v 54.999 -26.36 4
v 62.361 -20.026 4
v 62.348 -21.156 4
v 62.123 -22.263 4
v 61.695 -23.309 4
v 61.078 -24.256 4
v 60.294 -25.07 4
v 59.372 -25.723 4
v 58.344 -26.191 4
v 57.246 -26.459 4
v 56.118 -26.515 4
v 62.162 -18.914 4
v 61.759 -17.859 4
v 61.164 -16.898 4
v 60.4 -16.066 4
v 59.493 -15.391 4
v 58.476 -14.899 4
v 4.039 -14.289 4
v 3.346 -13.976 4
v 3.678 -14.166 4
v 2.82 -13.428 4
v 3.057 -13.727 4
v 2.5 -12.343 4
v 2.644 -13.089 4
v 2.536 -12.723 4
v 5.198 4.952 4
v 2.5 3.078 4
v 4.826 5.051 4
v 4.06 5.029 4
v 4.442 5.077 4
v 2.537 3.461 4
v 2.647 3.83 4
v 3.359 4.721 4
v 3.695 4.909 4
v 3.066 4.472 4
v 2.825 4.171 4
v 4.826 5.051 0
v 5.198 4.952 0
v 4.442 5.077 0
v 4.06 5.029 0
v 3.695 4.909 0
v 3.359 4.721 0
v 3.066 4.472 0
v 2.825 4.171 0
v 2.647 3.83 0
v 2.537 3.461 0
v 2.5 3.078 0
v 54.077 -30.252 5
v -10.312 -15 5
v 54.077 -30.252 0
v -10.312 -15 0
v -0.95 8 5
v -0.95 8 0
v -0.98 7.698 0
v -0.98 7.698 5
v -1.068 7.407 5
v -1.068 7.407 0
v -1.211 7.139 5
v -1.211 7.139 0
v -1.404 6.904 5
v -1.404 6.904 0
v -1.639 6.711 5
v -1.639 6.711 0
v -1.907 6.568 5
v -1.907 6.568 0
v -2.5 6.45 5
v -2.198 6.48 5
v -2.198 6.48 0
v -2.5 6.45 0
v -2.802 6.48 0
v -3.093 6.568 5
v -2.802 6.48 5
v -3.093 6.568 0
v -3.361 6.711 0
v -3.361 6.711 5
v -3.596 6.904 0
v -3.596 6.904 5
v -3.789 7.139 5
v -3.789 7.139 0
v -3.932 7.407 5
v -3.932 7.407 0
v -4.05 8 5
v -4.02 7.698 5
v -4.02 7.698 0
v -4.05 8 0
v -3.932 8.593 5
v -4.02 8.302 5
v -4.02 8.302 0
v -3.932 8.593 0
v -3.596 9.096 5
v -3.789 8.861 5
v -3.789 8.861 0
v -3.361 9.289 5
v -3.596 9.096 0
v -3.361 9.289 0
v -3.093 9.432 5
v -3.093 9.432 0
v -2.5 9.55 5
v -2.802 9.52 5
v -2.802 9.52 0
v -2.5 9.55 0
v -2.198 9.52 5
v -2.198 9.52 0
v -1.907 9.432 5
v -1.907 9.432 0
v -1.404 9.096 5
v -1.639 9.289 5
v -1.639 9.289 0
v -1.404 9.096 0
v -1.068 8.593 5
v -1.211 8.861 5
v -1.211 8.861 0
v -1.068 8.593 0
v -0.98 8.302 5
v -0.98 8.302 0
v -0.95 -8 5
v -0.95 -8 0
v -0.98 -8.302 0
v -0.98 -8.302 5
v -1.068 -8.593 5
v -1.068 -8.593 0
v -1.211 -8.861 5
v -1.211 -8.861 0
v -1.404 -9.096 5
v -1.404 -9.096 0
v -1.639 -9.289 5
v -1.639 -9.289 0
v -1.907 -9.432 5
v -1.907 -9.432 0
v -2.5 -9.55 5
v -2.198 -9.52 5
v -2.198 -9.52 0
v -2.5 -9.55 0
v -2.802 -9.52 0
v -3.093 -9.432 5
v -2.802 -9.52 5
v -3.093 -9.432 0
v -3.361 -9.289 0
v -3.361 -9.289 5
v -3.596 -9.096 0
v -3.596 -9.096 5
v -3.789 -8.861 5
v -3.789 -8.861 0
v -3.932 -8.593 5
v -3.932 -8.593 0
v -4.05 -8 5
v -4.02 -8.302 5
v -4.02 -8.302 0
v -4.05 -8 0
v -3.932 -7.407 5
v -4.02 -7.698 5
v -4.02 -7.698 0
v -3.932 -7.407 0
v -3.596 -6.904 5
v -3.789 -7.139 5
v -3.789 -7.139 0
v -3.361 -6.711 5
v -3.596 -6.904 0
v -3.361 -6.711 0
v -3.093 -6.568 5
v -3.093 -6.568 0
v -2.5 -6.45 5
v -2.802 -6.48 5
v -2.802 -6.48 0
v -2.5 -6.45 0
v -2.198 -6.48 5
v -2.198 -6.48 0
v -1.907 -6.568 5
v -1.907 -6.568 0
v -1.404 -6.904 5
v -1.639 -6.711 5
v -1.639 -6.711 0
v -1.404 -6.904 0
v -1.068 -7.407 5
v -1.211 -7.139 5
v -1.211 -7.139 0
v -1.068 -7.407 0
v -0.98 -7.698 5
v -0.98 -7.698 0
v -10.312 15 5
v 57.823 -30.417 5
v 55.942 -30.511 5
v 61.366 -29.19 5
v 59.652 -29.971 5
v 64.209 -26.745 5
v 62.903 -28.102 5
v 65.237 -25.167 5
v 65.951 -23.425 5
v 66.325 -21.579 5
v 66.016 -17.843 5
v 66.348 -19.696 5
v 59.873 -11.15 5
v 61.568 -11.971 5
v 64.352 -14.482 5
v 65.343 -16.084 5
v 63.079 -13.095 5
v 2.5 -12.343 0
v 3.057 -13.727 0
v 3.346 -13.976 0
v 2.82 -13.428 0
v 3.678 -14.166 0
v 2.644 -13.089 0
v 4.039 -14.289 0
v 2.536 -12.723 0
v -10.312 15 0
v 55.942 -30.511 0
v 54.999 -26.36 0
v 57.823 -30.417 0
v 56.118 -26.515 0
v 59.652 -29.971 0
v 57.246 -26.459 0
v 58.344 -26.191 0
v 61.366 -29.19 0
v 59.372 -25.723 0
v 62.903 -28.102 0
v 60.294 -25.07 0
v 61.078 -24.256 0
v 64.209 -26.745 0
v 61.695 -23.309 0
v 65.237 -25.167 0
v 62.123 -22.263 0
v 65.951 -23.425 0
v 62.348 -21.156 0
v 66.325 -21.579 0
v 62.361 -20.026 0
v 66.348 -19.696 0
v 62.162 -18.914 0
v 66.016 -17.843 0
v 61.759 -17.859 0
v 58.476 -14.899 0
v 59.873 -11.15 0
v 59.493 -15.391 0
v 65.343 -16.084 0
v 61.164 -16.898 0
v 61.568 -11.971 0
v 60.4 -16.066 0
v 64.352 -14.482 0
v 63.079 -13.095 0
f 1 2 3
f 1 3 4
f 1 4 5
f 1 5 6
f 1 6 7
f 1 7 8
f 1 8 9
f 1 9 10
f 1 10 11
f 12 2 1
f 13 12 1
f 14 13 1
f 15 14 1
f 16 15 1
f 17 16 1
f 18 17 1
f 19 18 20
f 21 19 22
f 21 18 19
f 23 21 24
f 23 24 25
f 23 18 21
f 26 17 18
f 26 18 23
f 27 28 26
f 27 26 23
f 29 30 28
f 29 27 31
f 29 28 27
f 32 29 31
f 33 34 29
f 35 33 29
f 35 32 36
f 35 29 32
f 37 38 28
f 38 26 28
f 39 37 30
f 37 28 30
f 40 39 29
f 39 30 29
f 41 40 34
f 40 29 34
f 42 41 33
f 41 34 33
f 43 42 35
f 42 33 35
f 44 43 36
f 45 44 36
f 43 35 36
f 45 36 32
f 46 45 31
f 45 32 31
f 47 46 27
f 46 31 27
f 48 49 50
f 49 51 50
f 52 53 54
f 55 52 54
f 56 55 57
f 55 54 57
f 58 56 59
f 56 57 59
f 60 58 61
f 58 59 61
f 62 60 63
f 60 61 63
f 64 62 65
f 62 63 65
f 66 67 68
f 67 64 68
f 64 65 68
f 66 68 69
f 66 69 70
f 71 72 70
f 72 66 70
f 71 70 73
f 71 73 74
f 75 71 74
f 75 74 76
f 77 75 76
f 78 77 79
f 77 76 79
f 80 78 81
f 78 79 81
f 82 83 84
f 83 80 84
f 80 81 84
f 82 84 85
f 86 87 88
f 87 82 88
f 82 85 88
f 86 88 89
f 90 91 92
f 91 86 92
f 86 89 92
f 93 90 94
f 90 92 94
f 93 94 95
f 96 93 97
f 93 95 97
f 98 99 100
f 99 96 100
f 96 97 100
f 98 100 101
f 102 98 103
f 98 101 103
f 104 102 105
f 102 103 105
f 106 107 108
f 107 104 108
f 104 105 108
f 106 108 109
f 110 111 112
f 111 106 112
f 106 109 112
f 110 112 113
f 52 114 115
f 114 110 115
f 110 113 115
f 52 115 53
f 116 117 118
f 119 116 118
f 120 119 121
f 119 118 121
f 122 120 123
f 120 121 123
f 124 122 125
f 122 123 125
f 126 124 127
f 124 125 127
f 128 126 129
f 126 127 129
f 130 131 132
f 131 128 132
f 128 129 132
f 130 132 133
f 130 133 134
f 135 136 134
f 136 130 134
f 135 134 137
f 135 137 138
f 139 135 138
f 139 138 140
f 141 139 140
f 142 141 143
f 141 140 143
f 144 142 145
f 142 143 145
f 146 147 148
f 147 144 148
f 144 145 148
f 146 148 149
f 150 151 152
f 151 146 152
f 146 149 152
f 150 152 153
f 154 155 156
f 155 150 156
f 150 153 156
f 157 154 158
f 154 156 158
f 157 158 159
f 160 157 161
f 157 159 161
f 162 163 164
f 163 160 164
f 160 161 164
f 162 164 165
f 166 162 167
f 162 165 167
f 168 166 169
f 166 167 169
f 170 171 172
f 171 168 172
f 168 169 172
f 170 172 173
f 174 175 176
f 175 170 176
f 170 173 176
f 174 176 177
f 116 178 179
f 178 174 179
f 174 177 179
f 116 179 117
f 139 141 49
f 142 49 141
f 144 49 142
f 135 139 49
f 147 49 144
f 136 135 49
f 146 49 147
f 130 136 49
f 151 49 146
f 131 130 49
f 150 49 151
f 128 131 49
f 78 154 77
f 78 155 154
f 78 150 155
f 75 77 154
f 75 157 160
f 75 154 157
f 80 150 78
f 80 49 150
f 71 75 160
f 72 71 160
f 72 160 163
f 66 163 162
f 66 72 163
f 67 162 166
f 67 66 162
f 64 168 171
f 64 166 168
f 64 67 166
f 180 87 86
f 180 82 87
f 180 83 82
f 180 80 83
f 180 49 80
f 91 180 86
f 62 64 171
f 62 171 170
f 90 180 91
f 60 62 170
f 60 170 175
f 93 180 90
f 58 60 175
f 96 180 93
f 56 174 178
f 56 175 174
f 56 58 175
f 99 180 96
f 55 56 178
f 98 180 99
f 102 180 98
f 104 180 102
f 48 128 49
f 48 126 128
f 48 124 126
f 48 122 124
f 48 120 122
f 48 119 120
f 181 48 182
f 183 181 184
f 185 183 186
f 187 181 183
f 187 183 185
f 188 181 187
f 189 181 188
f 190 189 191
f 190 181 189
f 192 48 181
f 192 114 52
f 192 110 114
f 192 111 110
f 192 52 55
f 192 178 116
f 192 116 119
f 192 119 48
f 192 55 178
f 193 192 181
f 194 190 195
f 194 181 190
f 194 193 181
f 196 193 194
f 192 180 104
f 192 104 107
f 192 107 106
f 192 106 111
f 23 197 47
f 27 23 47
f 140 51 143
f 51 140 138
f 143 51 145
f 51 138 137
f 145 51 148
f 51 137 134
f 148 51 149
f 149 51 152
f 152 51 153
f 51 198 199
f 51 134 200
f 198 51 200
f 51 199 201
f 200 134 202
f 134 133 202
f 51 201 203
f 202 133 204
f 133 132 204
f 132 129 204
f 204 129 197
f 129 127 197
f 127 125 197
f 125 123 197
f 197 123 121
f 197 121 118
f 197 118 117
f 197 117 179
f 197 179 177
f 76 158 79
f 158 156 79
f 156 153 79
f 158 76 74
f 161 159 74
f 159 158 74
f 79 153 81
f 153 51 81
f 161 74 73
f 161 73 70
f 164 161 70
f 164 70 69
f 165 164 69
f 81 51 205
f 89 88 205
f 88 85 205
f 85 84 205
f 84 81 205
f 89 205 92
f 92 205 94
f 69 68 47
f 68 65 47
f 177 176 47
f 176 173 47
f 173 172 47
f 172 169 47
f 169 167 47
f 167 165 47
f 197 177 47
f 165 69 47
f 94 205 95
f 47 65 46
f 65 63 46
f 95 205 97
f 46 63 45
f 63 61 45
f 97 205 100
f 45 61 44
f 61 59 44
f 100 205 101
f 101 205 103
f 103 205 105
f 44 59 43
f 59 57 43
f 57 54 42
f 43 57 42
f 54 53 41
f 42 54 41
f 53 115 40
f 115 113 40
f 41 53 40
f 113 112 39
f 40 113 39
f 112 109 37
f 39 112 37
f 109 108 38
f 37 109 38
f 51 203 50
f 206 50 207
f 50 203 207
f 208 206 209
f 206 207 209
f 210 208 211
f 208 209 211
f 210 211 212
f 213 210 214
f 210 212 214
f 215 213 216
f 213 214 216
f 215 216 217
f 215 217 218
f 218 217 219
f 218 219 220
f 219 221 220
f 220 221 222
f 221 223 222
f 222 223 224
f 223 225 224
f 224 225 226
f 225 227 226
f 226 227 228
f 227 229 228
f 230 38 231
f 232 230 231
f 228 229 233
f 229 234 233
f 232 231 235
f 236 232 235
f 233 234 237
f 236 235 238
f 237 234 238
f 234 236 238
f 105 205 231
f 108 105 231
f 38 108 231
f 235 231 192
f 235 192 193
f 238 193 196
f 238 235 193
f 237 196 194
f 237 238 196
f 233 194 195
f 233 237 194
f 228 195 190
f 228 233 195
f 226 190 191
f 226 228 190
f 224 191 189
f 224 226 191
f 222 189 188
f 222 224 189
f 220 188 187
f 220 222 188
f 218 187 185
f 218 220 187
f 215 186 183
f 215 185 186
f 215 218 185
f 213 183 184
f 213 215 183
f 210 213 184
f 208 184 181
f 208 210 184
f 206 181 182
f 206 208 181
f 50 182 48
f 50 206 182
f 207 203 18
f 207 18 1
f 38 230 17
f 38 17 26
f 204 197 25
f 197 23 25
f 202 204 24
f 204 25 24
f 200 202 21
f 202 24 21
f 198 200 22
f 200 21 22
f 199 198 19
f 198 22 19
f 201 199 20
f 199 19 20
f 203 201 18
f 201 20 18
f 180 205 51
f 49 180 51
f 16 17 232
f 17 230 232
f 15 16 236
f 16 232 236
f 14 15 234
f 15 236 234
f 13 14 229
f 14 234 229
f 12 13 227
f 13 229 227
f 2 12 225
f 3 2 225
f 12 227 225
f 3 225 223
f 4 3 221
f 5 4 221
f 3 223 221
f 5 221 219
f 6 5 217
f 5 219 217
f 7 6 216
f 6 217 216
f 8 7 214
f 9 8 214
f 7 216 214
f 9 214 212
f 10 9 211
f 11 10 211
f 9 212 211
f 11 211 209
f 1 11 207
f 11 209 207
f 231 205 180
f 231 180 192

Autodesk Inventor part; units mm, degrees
ref_plane "YZ Plane" through (0, 0, 0) normal (1, 0, 0) x (0, 1, 0)
ref_plane "XZ Plane" through (0, 0, 0) normal (0, 1, 0) x (-1, 0, 0)
ref_plane "XY Plane" through (0, 0, 0) normal (0, 0, 1) x (1, 0, 0)
sketch "スケッチ1" plane through (0, 0, 0) normal (0, 0, 1) x (1, 0, 0)
  line L0 (-10.3125, 15) -> (-10.3125, -15)
  line L1 (-10.3125, -15) -> (0, -9.5)
  line L2 (0, -9.5) -> (0, 9.5)
  line L3 (0, 9.5) -> (-10.3125, 15)
  circle A0 centre (-2.5, 8) radius 1.55
  circle A1 centre (-2.5, -8) radius 1.55
  circle A2 centre (-2.5, 8) radius 2.5 construction
  circle A3 centre (-2.5, -8) radius 2.5 construction
  line L4 (-2.5, 8) -> (-2.5, -8) construction
  line L5 (-10.3125, 15) -> (59.873, -11.1505)
  line L6 (-10.3125, -15) -> (54.0766, -30.2519)
  arc A4 (54.0766, -30.2519) -> (59.873, -11.1505) centre (56.3816, -20.5212) ccw
  line L7 (56.3816, -20.5212) -> (0, 0) construction
  point P0 (-2.5, 0)
  dimension "d5" = 19
  dimension "d8" = 30
  dimension "d10" = 5
  dimension "d20" = 16
  dimension "d33" = 3.1
  dimension "d35" = 10
  dimension "d41" = 70
  dimension "d43" = 60
extrude "押し出し1" add sketch "スケッチ1" along normal blind 5
sketch "スケッチ4" plane through (0, 0, 0) normal (0, 0, -1) x (-1, 0, 0)
  circle A0 centre (2.5, 8) radius 1.55 projected
  line L0 (-59.873, -11.1505) -> (10.3125, 15) projected
  arc A1 (-59.873, -11.1505) -> (-54.0766, -30.2519) centre (-56.3816, -20.5212) ccw projected
  line L1 (10.3125, -15) -> (-54.0766, -30.2519) projected
  line L2 (-2.5, -13.9242) -> (-54.9986, -26.3597)
  arc A2 (-58.4764, -14.8988) -> (-54.9986, -26.3597) centre (-56.3816, -20.5212) ccw
  line L3 (-58.4764, -14.8988) -> (-2.5, 5.9575)
  line L4 (-2.5, -13.9242) -> (-2.5, 5.9575)
  point P0 (0, 0)
  dimension "d81" = 4
  dimension "d82" = 5
extrude "押し出し4" cut sketch "スケッチ4" against normal blind 4 contours L2 A2 L3 L4
fillet "フィレット4" radius 2 2 edges at (2.5, 5.9575, 2) (2.5, -13.9242, 2)
equation "\"d5\" = d187"
equation "\"d8\" = d98"
equation "\"d10\" = d185"
equation "\"d20\" = d186"
equation "\"d185\" = 5"
equation "\"d187\" = 19"
equation "\"d98\" = 30"
equation "\"d186\" = 16"
properties part number "胴体_サブフレーム_1_6" material "アセタール樹脂、黒"
